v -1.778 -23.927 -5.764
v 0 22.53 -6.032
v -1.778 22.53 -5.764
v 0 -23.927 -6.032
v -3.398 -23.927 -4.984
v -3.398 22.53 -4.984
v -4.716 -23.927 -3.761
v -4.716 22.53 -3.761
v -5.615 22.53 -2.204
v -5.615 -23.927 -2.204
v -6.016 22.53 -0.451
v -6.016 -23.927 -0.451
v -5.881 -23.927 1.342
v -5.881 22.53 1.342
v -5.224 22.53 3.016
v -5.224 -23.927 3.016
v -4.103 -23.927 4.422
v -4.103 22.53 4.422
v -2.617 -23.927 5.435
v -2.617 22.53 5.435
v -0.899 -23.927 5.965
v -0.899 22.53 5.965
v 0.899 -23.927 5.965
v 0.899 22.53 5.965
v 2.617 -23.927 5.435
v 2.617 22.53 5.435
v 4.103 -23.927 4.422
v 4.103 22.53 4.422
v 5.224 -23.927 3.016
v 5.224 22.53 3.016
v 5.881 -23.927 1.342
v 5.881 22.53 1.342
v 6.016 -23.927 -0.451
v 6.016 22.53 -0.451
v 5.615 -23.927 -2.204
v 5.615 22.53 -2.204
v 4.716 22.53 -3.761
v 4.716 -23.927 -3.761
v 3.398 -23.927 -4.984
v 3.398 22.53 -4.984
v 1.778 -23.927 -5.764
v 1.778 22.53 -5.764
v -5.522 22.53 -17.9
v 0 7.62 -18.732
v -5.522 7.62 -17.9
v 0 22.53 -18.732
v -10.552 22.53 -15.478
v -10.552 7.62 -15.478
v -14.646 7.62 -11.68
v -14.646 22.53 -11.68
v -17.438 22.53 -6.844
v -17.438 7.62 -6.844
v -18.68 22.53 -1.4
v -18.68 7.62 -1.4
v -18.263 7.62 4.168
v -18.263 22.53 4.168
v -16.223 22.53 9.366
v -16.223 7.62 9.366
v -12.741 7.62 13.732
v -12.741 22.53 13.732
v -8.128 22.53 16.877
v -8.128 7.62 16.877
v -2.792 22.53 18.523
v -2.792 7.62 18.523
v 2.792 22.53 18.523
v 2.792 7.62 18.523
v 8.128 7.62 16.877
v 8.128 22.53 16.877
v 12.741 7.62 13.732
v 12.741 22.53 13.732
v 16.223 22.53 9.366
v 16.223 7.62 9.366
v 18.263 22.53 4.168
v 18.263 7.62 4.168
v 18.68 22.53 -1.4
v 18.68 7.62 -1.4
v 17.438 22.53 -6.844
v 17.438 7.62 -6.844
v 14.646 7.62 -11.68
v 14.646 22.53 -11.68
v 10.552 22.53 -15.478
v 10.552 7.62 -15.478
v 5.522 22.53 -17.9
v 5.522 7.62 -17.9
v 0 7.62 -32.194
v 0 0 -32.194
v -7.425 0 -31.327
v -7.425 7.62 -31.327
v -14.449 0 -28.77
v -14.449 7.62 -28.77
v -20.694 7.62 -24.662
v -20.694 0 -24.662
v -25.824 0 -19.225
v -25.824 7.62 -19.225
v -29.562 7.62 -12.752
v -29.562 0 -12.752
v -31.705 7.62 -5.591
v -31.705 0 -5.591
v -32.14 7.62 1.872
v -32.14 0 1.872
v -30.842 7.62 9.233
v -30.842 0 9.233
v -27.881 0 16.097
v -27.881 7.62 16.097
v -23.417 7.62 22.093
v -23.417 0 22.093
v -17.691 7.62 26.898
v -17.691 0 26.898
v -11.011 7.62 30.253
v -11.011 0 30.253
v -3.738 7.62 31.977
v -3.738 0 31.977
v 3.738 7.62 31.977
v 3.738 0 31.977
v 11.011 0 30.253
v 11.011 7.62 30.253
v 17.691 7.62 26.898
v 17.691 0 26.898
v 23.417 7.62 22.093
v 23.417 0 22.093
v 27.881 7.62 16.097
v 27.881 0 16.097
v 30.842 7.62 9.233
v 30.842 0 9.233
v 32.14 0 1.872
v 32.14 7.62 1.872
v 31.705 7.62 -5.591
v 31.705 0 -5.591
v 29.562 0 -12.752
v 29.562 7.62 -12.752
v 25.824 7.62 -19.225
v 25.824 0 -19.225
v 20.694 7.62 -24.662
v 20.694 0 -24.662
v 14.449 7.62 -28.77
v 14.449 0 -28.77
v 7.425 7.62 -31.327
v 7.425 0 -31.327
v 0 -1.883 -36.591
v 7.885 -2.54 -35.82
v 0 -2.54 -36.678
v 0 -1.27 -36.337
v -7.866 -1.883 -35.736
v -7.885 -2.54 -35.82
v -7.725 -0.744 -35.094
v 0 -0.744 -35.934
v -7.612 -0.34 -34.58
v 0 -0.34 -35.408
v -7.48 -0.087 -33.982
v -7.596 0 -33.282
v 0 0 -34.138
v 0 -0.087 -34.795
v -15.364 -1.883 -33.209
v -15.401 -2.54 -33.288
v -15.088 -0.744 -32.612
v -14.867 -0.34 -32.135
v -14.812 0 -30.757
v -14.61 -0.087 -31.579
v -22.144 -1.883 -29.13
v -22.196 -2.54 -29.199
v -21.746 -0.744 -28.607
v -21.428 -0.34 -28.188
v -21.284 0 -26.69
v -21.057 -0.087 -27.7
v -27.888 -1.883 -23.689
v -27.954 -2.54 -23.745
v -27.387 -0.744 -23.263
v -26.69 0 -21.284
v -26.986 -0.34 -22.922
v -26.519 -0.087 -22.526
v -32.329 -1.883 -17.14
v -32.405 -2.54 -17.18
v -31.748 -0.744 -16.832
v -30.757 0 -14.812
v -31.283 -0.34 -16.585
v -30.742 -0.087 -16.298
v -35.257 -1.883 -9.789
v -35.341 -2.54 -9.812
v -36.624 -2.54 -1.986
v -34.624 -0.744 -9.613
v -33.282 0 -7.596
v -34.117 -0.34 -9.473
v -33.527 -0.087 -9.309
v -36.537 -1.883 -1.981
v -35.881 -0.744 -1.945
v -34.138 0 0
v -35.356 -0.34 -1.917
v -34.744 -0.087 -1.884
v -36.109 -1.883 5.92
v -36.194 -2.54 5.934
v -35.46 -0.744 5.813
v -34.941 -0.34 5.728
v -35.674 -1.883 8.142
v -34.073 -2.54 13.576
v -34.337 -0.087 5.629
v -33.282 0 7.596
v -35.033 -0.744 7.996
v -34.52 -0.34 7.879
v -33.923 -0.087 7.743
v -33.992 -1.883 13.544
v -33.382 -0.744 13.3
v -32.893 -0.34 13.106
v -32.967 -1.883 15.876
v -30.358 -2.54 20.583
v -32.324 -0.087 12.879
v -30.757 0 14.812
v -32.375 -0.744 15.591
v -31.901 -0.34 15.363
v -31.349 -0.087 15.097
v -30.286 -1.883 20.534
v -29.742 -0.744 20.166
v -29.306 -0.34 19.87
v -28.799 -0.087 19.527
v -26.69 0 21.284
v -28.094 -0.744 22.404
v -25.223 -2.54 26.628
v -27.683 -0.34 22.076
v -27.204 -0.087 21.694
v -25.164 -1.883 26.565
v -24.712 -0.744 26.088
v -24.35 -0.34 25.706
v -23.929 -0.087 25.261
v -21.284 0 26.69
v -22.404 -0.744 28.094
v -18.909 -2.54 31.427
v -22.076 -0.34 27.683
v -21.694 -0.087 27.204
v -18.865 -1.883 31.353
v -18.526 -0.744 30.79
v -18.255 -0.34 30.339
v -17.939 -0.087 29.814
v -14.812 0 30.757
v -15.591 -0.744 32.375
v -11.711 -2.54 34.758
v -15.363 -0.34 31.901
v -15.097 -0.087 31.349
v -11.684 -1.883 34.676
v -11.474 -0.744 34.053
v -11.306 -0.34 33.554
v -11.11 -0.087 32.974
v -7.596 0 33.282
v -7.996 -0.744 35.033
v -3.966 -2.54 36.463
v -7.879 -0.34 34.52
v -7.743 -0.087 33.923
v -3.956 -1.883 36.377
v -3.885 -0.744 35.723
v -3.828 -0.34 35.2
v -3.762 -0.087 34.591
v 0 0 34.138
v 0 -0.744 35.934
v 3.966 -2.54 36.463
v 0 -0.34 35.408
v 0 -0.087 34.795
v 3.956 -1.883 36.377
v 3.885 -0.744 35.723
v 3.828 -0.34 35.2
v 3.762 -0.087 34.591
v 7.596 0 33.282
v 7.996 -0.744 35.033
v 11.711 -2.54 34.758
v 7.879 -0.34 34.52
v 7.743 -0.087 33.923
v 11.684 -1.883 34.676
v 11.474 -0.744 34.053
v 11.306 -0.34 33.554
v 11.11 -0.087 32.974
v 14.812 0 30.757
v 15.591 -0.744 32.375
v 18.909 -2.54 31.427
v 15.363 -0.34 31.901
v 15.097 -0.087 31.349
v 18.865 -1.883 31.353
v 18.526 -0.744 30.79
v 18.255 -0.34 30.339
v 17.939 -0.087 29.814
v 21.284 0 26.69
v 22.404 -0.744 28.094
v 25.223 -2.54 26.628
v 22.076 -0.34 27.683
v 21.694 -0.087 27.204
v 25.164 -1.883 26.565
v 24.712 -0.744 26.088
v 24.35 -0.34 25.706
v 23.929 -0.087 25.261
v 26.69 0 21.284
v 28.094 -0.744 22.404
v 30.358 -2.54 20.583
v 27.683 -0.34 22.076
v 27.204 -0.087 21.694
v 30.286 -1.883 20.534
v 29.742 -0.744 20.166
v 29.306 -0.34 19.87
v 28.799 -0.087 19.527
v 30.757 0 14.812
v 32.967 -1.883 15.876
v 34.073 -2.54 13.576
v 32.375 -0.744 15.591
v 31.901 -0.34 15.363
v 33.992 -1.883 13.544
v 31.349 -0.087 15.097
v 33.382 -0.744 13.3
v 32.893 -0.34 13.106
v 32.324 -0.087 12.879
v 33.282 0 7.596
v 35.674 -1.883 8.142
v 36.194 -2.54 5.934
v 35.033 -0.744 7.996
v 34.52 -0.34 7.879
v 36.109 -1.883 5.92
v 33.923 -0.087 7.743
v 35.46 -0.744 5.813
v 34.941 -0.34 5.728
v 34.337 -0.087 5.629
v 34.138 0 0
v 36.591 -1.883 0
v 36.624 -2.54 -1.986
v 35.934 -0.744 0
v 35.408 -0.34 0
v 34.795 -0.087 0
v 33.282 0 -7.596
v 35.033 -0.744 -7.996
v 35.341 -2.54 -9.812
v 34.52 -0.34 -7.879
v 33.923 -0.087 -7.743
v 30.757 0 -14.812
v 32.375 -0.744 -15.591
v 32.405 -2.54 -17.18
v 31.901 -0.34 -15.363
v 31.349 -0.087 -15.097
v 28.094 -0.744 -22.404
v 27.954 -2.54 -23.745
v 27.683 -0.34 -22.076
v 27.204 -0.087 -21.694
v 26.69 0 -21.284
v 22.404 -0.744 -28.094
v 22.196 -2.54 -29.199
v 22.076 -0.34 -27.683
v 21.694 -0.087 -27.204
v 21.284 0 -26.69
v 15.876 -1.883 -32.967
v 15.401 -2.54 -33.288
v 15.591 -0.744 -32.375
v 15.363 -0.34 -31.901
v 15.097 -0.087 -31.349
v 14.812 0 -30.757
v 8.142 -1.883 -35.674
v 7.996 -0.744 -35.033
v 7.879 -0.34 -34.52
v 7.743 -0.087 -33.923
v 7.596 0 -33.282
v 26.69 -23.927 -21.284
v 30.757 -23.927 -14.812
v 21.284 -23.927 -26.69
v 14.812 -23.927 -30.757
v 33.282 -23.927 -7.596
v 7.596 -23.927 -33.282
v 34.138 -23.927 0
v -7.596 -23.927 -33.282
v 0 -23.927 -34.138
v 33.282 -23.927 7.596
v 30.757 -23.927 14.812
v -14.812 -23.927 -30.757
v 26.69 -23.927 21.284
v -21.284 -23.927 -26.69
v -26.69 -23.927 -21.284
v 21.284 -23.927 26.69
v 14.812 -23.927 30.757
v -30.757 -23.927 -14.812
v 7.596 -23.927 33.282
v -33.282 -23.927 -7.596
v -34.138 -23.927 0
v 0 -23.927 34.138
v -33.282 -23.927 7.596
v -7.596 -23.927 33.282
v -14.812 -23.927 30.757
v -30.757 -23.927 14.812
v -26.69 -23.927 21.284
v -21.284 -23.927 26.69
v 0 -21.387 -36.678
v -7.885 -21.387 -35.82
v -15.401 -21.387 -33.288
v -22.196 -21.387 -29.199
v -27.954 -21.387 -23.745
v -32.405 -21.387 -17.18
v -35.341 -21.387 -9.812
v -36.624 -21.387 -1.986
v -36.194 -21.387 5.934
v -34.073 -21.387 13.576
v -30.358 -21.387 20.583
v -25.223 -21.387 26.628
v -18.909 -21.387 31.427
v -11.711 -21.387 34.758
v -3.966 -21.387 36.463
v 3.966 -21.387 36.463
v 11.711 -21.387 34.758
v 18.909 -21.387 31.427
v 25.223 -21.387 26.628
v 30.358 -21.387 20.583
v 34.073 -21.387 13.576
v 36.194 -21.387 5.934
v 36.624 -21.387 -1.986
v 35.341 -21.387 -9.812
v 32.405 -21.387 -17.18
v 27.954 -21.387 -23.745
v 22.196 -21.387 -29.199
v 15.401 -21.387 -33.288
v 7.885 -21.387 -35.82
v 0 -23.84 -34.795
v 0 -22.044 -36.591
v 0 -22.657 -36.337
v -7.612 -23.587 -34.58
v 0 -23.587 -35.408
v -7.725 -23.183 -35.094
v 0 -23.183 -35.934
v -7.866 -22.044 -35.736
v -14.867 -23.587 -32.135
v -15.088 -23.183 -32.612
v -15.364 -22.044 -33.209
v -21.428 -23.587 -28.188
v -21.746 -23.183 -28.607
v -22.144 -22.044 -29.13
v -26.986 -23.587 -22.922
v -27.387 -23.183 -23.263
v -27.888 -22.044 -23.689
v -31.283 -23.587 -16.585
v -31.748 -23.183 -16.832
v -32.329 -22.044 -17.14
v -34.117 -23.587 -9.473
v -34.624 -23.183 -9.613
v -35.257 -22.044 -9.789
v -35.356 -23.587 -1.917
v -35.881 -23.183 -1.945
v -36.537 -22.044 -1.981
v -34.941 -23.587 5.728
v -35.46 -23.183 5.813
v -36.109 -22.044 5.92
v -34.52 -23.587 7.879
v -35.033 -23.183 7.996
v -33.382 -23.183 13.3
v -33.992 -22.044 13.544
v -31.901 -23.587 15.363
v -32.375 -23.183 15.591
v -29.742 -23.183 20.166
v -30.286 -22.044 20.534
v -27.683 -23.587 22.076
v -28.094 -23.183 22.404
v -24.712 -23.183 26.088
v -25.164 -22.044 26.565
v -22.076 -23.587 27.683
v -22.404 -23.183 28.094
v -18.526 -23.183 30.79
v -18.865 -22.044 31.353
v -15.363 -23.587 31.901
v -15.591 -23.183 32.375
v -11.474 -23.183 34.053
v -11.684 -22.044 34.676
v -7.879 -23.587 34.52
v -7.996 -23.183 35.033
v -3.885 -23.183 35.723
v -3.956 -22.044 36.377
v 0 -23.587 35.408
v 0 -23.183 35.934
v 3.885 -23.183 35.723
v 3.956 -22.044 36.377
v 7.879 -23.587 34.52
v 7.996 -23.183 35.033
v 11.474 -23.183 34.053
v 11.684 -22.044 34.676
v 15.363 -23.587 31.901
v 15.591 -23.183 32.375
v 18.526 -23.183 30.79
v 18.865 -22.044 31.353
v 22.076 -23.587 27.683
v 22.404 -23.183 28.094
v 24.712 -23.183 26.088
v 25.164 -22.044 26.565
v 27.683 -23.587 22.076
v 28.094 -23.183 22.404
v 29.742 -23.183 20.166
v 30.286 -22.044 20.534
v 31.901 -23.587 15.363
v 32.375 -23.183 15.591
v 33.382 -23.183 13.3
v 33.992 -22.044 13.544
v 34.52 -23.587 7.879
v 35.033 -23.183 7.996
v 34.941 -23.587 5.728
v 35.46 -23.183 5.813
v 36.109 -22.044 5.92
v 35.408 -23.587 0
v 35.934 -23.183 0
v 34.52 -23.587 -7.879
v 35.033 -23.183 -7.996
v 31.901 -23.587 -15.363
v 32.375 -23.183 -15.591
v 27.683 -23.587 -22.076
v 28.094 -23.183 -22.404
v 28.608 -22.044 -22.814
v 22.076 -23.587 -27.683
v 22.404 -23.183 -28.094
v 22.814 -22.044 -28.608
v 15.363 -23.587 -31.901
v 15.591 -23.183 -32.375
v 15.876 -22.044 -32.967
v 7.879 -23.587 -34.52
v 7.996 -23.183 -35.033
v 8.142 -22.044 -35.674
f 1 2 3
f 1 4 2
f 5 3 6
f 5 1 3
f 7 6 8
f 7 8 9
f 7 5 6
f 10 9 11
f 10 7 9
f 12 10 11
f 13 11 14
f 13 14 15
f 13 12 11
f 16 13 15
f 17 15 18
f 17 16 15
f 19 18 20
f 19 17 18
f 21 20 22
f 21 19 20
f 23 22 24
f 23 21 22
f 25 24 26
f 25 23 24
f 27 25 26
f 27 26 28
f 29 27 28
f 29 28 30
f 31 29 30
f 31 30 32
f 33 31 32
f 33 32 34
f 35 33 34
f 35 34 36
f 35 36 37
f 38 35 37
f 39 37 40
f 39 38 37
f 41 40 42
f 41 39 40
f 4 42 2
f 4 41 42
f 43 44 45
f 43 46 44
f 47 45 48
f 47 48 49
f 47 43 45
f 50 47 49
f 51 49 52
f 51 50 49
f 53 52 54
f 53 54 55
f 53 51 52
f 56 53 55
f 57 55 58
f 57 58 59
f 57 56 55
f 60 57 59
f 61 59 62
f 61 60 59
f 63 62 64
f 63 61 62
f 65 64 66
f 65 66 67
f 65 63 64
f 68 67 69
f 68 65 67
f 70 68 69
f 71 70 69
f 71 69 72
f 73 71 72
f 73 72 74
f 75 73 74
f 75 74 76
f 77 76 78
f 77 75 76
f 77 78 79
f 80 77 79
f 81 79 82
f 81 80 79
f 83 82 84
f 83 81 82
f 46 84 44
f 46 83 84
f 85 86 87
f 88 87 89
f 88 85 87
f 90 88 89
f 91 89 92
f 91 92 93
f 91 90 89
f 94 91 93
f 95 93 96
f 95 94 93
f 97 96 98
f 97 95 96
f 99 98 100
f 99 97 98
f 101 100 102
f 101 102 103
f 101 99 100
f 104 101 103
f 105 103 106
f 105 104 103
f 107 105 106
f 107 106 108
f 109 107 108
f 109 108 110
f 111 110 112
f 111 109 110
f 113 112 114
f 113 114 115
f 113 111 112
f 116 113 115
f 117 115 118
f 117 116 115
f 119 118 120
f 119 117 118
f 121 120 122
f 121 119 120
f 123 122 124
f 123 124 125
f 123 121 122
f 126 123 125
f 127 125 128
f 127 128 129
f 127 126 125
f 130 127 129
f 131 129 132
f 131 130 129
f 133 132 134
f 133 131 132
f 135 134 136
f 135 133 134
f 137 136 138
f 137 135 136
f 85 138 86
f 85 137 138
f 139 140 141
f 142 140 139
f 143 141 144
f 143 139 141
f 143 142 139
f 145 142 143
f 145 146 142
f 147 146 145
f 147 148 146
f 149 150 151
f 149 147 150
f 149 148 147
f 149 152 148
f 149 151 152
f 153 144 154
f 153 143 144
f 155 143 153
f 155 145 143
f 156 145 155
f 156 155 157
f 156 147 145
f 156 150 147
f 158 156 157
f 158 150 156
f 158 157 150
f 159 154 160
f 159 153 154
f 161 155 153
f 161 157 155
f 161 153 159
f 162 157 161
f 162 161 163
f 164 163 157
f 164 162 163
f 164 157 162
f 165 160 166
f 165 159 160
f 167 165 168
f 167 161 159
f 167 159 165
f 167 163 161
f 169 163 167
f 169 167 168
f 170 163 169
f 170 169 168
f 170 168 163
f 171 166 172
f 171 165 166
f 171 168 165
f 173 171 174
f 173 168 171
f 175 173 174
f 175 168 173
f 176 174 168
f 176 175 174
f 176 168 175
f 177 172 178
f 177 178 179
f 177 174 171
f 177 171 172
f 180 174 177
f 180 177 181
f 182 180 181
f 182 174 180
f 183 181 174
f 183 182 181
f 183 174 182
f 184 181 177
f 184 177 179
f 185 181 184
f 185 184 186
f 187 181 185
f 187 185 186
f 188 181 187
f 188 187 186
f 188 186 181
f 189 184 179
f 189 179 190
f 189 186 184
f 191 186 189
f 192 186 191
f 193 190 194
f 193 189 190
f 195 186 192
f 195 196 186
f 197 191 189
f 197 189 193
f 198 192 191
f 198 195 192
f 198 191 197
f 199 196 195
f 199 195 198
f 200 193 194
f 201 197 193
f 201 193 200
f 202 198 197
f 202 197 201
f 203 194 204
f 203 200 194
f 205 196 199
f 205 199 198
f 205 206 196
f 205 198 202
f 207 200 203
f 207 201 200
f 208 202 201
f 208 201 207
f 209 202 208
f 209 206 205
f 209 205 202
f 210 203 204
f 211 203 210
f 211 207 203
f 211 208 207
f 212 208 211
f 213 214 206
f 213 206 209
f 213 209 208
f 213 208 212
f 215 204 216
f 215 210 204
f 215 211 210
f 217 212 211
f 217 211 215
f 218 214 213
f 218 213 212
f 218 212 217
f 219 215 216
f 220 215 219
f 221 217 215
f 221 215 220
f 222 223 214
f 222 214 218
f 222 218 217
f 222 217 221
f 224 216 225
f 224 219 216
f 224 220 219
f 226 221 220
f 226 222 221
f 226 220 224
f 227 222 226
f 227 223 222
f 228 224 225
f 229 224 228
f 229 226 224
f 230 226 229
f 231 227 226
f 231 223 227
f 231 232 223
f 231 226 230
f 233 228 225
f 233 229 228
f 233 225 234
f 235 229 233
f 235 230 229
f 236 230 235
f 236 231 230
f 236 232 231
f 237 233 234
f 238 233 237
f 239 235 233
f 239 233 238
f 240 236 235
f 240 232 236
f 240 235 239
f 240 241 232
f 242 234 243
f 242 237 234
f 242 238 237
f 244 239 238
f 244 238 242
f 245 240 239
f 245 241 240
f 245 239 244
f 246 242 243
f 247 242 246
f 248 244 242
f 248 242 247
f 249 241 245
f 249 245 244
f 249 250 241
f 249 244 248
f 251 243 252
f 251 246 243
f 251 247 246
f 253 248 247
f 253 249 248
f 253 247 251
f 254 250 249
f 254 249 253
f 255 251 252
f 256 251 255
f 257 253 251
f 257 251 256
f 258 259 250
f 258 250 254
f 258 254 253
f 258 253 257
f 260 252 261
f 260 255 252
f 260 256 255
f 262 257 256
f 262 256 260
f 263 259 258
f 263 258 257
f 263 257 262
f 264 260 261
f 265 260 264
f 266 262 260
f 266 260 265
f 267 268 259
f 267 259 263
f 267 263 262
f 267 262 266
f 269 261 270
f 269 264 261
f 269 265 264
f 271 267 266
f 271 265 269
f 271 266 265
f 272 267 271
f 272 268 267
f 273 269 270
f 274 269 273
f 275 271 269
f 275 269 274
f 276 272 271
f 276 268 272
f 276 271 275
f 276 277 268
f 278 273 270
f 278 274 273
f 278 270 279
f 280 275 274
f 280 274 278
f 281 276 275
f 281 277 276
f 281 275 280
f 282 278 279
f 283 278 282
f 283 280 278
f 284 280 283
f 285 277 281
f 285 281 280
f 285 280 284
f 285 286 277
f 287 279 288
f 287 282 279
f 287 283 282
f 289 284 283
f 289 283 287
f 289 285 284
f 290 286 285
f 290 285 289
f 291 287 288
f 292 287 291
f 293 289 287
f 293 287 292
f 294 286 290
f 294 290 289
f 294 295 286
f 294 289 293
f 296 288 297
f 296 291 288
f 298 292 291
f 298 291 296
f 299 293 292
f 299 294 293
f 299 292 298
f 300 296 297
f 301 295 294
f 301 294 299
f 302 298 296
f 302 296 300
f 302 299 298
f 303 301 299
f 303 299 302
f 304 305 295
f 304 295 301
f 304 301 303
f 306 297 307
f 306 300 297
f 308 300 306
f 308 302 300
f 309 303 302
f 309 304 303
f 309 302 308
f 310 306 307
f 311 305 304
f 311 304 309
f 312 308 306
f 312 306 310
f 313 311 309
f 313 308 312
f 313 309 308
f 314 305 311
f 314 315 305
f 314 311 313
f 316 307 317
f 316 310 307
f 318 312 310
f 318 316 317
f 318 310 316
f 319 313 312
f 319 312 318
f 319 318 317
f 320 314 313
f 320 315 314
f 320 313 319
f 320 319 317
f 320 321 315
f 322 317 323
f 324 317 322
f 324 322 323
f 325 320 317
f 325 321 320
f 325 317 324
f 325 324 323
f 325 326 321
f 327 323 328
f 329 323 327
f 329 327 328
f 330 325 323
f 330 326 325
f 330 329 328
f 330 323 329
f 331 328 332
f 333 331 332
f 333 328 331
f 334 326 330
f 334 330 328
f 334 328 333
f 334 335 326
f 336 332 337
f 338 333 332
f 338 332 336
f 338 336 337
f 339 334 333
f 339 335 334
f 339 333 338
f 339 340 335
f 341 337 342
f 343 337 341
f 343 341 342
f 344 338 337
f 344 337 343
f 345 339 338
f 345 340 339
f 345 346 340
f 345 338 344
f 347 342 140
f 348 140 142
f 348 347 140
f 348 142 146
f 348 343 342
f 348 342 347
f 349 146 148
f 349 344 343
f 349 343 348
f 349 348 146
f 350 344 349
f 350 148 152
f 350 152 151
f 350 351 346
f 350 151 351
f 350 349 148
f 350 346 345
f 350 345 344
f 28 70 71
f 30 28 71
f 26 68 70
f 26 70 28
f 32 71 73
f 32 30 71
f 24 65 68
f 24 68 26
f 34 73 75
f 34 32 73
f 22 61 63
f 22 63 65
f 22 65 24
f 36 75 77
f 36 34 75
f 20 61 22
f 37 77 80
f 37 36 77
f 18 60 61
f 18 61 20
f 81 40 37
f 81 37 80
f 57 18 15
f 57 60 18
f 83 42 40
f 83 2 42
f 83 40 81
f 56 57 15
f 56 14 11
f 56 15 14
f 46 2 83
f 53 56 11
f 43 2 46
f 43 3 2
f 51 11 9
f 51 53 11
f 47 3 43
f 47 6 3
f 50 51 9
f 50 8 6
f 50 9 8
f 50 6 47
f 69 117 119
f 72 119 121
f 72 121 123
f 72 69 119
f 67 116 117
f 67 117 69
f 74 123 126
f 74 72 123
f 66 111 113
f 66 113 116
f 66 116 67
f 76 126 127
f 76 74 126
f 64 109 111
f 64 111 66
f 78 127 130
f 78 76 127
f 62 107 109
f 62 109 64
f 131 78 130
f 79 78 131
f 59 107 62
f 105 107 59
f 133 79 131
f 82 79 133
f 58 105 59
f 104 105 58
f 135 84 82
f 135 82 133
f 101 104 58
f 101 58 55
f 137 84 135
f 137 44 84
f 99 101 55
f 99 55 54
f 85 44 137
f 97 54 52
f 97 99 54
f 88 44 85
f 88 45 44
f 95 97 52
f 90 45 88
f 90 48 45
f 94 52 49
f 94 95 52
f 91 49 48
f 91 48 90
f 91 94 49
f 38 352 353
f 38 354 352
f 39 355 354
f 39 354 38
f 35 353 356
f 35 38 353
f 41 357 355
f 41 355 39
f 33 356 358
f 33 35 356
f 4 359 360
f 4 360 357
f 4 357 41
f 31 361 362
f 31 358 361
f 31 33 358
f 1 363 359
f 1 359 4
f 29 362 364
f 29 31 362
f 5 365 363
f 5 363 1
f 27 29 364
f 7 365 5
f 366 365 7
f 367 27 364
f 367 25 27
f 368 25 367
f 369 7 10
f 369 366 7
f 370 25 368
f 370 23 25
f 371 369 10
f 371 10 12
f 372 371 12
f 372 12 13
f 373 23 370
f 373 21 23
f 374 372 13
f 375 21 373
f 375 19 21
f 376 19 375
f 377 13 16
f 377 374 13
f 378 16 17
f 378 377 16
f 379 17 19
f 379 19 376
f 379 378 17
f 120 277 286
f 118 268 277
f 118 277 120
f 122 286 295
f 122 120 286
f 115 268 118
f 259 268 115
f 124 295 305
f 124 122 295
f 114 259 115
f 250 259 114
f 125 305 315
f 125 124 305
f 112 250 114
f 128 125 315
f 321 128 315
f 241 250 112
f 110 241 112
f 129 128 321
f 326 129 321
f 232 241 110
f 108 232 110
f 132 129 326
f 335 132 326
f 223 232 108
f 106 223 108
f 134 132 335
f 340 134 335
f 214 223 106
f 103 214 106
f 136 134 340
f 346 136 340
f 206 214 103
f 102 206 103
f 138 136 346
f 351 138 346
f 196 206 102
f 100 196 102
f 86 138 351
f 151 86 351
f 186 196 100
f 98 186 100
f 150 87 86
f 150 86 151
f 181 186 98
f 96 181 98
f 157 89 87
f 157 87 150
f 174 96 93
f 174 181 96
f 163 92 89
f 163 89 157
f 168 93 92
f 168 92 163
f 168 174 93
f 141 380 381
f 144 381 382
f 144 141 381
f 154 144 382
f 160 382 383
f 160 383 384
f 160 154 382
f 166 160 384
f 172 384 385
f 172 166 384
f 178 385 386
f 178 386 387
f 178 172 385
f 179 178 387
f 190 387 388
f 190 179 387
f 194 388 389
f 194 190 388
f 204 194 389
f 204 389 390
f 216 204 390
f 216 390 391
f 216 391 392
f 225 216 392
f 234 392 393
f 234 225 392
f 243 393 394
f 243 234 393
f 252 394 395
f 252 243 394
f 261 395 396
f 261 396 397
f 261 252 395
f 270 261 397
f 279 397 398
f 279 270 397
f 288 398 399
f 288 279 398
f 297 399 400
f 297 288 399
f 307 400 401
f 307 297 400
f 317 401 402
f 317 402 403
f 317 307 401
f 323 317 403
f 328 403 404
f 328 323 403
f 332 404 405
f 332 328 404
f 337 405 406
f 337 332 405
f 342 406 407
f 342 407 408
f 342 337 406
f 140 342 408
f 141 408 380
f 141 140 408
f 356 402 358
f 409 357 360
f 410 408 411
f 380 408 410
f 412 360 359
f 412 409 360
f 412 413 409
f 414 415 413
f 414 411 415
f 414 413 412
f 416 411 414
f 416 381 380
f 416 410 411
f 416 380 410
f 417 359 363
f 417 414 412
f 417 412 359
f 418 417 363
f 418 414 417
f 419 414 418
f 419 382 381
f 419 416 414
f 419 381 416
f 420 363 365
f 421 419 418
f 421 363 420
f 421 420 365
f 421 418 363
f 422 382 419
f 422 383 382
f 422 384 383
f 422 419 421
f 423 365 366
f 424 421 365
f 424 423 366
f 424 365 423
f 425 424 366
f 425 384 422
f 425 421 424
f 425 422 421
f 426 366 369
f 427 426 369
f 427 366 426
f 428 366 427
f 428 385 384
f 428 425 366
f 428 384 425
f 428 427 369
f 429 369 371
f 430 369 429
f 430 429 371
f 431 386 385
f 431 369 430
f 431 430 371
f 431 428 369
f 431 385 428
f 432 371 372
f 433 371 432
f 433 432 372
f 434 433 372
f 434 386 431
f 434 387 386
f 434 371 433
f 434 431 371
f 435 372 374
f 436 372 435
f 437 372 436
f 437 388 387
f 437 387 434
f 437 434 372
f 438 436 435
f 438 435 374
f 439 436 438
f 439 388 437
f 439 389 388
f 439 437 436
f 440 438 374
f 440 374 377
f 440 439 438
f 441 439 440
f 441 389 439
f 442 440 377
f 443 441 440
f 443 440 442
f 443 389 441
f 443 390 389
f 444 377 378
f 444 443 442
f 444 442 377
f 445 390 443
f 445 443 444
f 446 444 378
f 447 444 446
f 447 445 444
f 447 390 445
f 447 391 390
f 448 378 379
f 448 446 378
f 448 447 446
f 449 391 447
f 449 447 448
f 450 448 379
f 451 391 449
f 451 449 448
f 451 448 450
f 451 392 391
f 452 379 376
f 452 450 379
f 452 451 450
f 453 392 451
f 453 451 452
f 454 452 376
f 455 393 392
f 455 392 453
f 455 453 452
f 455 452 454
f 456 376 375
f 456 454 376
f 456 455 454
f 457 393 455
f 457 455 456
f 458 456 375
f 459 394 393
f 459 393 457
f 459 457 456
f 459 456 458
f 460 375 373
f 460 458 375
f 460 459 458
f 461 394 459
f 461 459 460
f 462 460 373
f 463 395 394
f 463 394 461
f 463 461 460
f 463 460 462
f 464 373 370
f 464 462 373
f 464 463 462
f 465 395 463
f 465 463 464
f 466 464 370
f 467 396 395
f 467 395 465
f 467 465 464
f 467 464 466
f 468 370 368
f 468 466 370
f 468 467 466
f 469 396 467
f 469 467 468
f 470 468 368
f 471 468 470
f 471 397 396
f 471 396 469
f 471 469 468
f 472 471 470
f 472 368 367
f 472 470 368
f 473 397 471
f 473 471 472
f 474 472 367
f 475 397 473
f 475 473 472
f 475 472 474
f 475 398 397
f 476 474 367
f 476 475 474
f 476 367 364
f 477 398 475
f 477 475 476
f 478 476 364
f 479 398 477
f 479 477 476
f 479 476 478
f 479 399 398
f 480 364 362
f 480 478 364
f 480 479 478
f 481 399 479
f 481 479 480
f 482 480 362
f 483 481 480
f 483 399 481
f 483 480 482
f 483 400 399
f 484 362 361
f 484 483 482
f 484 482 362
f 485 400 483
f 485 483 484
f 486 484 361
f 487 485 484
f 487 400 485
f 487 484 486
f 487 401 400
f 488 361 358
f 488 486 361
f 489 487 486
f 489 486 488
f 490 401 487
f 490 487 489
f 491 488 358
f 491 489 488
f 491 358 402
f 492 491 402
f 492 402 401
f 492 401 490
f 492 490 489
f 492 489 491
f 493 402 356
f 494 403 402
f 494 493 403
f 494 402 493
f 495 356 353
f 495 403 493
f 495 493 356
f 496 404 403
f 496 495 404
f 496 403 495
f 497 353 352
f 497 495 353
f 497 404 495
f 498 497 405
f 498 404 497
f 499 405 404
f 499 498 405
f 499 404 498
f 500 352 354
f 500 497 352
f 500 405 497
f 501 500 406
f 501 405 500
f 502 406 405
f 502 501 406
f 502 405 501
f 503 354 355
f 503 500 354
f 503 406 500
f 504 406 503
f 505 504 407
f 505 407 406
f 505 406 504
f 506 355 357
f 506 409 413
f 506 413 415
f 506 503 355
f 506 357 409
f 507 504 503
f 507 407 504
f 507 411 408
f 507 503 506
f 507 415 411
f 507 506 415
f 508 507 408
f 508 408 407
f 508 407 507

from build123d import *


with BuildPart() as part:
    # Sketch1 → Revolve1 (revolve)
    with BuildSketch(Plane.XY, mode=Mode.PRIVATE) as revolve1_sk:
        Polygon((18.7325, 22.5298), (6.0325, 22.5298), (6.0325, 0), (32.1945, 0), (32.1945, 7.62), (18.7325, 7.62), align=None)
        with BuildLine():
            Line((32.1945, 0), (6.0325, 0))
            Line((6.0325, 0), (6.0325, -23.9268))
            Line((6.0325, -23.9268), (34.1376, -23.9268))
            ThreePointArc((34.1376, -23.9268), (35.933651224, -23.182851224), (36.6776, -21.3868))
            Line((36.6776, -21.3868), (36.6776, -2.54))
            ThreePointArc((36.6776, -2.54), (35.933651224, -0.743948776), (34.1376, 0))
            Line((34.1376, 0), (32.1945, 0))
        make_face()
    revolve(revolve1_sk.sketch.rotate(Axis((0, 0, 0), (0, 1, 0)), 90), axis=Axis((0, 0, 0), (0, 1, 0)))


solid = part.part
